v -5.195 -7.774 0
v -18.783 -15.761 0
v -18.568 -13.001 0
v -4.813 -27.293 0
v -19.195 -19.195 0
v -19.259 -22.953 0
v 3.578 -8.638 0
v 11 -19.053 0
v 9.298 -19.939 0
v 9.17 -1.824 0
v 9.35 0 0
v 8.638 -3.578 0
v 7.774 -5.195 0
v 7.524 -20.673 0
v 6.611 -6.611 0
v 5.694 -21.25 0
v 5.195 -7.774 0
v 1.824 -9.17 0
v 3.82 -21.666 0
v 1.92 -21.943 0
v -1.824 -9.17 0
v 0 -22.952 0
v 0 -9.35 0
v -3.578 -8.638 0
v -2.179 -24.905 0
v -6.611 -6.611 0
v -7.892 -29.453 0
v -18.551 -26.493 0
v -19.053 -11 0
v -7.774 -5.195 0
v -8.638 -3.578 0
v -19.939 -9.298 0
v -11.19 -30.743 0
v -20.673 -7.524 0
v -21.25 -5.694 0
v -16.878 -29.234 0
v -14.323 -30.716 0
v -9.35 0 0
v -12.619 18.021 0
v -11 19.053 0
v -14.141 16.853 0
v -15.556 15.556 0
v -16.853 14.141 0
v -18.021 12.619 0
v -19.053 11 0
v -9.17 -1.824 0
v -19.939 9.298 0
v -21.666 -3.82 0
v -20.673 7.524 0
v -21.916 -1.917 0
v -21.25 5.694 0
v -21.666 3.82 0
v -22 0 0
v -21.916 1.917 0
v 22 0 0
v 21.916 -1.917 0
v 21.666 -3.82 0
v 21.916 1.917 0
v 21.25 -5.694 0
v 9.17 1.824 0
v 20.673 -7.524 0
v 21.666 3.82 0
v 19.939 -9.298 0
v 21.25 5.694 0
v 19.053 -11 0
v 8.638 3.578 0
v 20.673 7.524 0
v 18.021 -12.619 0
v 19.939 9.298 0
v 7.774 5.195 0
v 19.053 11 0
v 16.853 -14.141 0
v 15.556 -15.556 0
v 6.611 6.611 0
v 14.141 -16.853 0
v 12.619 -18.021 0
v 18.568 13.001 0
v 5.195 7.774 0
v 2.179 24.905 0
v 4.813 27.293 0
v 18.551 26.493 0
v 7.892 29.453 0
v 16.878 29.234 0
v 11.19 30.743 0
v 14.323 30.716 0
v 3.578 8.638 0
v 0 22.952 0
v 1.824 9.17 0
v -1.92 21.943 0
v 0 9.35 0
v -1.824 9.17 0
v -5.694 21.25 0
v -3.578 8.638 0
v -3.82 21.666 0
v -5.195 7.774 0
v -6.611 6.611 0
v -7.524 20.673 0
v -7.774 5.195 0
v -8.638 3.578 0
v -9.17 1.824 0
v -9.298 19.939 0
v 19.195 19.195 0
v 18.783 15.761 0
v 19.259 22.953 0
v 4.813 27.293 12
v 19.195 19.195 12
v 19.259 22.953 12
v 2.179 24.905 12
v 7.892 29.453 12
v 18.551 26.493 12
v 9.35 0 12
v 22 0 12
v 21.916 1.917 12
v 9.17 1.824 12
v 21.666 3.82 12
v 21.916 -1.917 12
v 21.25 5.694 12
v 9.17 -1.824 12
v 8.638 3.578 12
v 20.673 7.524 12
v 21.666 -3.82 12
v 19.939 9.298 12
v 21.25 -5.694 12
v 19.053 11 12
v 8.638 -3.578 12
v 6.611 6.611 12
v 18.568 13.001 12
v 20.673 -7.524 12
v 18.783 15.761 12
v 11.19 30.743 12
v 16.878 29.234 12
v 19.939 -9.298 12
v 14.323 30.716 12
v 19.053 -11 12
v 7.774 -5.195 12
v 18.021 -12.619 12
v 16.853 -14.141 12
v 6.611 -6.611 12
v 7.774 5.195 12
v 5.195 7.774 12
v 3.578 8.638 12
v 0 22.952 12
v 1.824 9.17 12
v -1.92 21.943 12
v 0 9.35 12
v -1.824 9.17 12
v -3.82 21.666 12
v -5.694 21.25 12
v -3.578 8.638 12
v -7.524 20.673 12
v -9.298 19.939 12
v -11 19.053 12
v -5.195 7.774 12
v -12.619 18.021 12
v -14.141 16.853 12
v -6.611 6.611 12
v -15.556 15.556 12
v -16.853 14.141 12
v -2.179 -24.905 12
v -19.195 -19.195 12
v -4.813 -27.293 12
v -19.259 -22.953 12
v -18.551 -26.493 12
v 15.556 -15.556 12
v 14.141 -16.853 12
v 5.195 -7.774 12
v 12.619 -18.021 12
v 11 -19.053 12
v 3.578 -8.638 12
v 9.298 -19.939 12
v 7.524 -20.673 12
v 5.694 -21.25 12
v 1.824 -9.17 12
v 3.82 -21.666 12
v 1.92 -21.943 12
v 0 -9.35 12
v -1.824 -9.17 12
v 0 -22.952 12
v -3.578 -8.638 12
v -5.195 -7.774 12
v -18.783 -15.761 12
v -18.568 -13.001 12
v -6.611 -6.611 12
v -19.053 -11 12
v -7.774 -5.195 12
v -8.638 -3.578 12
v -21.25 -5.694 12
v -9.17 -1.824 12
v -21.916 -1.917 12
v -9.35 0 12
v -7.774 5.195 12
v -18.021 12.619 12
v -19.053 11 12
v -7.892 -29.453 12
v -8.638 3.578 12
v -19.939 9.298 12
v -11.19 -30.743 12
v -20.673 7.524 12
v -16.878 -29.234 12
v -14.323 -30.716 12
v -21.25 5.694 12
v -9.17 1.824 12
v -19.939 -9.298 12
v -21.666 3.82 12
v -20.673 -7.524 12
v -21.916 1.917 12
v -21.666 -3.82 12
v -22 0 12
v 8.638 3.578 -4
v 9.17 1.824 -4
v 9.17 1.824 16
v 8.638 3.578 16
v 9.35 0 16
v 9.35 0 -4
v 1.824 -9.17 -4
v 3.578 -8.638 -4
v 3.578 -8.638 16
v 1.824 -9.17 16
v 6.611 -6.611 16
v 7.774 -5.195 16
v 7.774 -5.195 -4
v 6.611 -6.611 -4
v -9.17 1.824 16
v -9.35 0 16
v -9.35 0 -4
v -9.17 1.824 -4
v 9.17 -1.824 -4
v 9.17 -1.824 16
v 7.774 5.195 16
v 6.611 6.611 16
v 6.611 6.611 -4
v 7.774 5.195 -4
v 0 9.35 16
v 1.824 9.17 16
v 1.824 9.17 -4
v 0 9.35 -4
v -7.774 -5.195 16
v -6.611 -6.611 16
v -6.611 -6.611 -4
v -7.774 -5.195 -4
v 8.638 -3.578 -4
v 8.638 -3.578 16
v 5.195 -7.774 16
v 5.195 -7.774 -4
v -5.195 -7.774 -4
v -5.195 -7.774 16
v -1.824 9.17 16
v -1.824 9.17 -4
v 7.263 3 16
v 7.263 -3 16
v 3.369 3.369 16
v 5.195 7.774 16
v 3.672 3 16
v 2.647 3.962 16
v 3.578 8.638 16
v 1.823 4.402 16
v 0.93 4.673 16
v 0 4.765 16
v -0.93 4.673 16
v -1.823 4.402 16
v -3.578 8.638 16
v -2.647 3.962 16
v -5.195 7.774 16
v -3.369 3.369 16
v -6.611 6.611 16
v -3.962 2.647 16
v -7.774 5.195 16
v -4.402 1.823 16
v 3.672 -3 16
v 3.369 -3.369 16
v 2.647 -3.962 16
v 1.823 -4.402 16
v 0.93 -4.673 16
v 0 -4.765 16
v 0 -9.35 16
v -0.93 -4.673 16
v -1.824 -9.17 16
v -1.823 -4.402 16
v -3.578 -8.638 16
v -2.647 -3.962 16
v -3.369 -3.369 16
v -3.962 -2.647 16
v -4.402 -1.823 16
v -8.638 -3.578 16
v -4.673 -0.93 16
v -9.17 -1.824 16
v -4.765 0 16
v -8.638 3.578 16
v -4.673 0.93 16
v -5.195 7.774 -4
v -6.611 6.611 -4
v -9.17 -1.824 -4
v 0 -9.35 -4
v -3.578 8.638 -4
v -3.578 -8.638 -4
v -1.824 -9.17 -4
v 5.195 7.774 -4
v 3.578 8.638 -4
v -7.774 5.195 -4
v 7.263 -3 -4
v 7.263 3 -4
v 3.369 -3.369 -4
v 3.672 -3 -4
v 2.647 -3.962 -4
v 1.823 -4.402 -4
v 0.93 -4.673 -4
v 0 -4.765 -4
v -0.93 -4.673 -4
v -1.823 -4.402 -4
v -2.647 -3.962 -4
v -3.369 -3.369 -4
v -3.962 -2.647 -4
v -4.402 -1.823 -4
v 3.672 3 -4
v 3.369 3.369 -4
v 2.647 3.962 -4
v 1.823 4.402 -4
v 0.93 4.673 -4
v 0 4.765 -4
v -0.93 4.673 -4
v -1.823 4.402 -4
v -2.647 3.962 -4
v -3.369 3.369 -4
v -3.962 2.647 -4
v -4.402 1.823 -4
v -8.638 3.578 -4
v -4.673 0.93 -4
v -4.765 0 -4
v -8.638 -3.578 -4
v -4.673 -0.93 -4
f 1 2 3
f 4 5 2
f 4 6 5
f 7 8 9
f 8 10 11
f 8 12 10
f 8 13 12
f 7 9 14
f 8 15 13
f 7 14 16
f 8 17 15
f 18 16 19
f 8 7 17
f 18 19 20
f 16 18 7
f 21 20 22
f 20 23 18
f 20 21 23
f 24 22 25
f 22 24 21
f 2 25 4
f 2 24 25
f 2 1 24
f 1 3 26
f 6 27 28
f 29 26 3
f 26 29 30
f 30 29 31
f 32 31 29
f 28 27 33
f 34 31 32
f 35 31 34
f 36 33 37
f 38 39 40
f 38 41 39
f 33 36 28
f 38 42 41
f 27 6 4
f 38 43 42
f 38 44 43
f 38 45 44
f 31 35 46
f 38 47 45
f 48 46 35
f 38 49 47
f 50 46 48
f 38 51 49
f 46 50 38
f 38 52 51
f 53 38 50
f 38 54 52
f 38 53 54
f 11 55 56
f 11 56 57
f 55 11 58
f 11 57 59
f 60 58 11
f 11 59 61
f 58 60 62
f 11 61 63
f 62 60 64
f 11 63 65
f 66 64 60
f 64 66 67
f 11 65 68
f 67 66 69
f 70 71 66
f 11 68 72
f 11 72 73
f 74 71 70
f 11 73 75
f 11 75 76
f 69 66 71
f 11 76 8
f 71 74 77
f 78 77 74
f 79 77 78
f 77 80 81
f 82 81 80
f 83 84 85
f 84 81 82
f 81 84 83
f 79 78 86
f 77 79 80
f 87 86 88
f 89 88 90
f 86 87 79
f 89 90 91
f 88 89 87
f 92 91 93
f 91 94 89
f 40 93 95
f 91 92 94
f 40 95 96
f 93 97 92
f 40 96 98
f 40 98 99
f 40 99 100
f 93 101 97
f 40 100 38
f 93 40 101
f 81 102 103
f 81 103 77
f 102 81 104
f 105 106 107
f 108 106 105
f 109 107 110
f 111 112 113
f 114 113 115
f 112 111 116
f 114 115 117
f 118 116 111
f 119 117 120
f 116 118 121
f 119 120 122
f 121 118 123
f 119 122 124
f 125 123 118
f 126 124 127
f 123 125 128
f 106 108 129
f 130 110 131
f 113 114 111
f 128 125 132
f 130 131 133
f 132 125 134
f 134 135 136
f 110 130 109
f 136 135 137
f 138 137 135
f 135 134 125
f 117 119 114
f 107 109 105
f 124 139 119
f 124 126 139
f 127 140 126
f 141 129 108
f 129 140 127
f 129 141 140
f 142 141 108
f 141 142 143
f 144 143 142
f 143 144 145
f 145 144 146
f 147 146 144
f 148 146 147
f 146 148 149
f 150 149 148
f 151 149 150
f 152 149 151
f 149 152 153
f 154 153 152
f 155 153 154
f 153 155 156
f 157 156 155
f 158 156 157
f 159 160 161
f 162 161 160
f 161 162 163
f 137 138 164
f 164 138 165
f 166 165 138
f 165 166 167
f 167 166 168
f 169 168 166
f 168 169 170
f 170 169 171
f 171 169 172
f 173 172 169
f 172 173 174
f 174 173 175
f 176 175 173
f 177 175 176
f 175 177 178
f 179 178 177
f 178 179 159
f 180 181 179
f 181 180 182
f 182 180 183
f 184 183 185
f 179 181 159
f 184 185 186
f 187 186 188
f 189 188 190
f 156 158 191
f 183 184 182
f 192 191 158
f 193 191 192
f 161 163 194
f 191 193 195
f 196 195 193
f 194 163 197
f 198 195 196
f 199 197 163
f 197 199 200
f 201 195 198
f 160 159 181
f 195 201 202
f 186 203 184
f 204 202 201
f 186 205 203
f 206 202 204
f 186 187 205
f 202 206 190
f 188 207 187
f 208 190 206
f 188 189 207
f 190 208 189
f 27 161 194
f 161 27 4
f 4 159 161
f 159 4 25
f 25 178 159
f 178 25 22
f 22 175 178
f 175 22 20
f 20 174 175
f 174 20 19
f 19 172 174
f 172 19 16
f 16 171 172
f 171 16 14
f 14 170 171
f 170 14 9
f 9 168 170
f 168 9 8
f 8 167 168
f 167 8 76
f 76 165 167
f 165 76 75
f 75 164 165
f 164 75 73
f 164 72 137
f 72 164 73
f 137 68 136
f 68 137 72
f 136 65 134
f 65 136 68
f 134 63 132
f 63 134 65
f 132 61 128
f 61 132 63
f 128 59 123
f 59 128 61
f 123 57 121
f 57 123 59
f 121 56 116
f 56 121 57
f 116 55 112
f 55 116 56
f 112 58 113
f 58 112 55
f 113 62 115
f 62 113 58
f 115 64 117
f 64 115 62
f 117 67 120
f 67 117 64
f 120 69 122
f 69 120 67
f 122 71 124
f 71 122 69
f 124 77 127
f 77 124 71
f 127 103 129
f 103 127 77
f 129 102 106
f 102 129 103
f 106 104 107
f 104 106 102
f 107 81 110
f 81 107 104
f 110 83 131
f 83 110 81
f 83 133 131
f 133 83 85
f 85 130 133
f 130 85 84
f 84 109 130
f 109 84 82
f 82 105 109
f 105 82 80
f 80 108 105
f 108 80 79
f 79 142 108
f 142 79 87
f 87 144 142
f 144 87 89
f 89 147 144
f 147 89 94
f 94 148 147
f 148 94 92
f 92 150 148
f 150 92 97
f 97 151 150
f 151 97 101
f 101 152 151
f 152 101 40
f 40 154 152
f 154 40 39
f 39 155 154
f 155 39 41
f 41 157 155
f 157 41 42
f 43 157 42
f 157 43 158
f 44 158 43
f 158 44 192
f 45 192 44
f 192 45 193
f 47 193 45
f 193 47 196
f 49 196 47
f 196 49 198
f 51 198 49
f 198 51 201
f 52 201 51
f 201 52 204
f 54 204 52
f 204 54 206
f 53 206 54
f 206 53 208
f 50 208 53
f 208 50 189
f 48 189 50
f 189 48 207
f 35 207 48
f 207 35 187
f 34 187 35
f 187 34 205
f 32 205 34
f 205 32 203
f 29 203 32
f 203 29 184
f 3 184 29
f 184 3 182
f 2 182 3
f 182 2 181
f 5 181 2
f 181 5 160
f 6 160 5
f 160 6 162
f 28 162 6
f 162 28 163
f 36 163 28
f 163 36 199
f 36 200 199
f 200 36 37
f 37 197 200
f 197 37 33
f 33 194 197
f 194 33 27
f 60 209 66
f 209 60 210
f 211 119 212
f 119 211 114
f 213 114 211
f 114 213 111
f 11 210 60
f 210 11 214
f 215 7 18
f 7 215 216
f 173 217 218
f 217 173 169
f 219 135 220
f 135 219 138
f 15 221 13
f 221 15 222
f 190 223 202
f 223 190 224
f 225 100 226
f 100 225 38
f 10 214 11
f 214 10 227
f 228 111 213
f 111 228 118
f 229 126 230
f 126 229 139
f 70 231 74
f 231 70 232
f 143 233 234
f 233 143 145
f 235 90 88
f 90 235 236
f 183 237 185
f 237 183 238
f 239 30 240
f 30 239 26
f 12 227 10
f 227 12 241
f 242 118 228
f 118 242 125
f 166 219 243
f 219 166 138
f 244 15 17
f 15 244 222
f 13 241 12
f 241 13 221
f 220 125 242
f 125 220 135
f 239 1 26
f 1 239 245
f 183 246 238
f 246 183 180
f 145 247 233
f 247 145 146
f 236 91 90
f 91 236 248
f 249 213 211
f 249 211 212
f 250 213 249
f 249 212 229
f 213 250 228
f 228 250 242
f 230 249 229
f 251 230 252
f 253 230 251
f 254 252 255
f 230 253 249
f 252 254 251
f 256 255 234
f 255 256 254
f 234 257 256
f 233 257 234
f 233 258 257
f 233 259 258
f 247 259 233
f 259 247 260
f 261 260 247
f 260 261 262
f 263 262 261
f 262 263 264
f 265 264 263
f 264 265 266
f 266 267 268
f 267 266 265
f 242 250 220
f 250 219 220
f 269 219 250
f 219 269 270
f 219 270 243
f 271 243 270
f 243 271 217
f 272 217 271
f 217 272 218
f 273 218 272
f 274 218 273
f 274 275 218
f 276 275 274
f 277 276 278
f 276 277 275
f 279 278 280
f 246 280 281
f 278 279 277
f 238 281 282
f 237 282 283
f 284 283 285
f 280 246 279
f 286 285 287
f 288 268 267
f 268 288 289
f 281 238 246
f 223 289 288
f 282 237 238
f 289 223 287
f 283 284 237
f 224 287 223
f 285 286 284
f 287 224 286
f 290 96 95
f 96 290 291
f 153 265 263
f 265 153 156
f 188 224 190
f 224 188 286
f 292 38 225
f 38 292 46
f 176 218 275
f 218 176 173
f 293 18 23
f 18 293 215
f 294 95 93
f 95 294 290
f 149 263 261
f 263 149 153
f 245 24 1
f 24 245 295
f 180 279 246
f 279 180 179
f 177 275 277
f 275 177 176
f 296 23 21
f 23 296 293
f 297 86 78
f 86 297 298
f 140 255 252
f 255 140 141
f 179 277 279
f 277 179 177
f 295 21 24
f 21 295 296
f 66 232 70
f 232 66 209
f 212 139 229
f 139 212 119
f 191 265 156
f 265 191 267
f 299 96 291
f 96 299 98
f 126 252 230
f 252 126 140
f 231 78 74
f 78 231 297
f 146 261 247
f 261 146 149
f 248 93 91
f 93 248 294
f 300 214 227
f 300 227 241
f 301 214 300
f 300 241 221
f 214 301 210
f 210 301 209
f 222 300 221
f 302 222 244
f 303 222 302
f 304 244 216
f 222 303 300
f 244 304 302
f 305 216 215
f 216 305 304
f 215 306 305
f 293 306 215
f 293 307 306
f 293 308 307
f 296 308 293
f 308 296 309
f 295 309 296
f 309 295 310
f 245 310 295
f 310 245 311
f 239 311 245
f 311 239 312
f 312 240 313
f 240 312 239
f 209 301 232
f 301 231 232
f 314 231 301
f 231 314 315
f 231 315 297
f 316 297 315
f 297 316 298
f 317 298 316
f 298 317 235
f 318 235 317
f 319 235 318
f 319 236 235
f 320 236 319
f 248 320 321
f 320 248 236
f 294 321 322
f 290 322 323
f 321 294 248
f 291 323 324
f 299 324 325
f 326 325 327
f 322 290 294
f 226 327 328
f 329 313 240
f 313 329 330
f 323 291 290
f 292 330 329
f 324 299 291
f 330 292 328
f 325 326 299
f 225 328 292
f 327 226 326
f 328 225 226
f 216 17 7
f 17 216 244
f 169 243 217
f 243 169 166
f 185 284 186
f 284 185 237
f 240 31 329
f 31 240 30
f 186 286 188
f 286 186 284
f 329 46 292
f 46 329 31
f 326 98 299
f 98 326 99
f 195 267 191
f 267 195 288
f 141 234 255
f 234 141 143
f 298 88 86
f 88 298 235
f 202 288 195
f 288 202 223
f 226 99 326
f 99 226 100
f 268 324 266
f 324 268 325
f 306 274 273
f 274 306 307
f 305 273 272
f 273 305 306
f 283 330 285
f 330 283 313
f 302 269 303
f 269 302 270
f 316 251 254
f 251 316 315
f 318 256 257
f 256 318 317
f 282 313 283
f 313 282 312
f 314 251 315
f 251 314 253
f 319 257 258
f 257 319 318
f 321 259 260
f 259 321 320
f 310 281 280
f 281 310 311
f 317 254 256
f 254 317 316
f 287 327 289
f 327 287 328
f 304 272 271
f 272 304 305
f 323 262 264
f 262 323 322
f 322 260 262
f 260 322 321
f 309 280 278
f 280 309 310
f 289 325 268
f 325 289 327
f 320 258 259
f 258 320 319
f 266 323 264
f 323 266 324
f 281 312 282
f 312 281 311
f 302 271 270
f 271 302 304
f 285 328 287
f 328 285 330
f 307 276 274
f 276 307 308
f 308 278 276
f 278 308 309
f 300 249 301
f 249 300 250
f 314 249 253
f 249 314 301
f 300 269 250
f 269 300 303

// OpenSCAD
$fn = 32;

// ----------------------------------------------------------------------
// Cam: base radius 22 mm with a 12 mm lift over 120 degrees
// ----------------------------------------------------------------------

// --- parameters (mm) ---
base_r = 22;              // base radius
lift = 12;                // lift height above the base radius
lift_span = 120;          // angular width of the lift
lift_start = 30;          // angle where the lift starts
cam_t = 12;               // cam plate thickness
hub_d = 18.7;             // hub diameter
hub_h = 20;               // hub height
bore_d = 9.53;            // bore
key_w = 6;                // keyway width
key_depth = 2.59;         // keyway depth

cam_profile = [[22, 0], [21.916, 1.917], [21.666, 3.82], [21.25, 5.694], [20.673, 7.524], [19.939, 9.298], [19.053, 11], [18.568, 13.001], [18.783, 15.761], [19.195, 19.195], [19.259, 22.953], [18.551, 26.493], [16.878, 29.234], [14.323, 30.716], [11.19, 30.743], [7.892, 29.453], [4.813, 27.293], [2.179, 24.905], [0, 22.952], [-1.92, 21.943], [-3.82, 21.666], [-5.694, 21.25], [-7.524, 20.673], [-9.298, 19.939], [-11, 19.053], [-12.619, 18.021], [-14.141, 16.853], [-15.556, 15.556], [-16.853, 14.141], [-18.021, 12.619], [-19.053, 11], [-19.939, 9.298], [-20.673, 7.524], [-21.25, 5.694], [-21.666, 3.82], [-21.916, 1.917], [-22, 0], [-21.916, -1.917], [-21.666, -3.82], [-21.25, -5.694], [-20.673, -7.524], [-19.939, -9.298], [-19.053, -11], [-18.568, -13.001], [-18.783, -15.761], [-19.195, -19.195], [-19.259, -22.953], [-18.551, -26.493], [-16.878, -29.234], [-14.323, -30.716], [-11.19, -30.743], [-7.892, -29.453], [-4.813, -27.293], [-2.179, -24.905], [0, -22.952], [1.92, -21.943], [3.82, -21.666], [5.694, -21.25], [7.524, -20.673], [9.298, -19.939], [11, -19.053], [12.619, -18.021], [14.141, -16.853], [15.556, -15.556], [16.853, -14.141], [18.021, -12.619], [19.053, -11], [19.939, -9.298], [20.673, -7.524], [21.25, -5.694], [21.666, -3.82], [21.916, -1.917]];

difference() {
  union() {
    linear_extrude(height = cam_t) polygon(cam_profile);
    /* hub, proud of the cam plate on both sides */
    translate([0, 0, -4]) cylinder(h = hub_h, d = hub_d);
  }
  /* bore through the hub, 2.5 mm clear on both faces */
  translate([0, 0, -6.5]) cylinder(h = hub_h + 5, d = bore_d);
  /* keyway, milled through the whole hub */
  translate([2.173, -3, -6.5]) cube([5.09, 6, 25]);
}
